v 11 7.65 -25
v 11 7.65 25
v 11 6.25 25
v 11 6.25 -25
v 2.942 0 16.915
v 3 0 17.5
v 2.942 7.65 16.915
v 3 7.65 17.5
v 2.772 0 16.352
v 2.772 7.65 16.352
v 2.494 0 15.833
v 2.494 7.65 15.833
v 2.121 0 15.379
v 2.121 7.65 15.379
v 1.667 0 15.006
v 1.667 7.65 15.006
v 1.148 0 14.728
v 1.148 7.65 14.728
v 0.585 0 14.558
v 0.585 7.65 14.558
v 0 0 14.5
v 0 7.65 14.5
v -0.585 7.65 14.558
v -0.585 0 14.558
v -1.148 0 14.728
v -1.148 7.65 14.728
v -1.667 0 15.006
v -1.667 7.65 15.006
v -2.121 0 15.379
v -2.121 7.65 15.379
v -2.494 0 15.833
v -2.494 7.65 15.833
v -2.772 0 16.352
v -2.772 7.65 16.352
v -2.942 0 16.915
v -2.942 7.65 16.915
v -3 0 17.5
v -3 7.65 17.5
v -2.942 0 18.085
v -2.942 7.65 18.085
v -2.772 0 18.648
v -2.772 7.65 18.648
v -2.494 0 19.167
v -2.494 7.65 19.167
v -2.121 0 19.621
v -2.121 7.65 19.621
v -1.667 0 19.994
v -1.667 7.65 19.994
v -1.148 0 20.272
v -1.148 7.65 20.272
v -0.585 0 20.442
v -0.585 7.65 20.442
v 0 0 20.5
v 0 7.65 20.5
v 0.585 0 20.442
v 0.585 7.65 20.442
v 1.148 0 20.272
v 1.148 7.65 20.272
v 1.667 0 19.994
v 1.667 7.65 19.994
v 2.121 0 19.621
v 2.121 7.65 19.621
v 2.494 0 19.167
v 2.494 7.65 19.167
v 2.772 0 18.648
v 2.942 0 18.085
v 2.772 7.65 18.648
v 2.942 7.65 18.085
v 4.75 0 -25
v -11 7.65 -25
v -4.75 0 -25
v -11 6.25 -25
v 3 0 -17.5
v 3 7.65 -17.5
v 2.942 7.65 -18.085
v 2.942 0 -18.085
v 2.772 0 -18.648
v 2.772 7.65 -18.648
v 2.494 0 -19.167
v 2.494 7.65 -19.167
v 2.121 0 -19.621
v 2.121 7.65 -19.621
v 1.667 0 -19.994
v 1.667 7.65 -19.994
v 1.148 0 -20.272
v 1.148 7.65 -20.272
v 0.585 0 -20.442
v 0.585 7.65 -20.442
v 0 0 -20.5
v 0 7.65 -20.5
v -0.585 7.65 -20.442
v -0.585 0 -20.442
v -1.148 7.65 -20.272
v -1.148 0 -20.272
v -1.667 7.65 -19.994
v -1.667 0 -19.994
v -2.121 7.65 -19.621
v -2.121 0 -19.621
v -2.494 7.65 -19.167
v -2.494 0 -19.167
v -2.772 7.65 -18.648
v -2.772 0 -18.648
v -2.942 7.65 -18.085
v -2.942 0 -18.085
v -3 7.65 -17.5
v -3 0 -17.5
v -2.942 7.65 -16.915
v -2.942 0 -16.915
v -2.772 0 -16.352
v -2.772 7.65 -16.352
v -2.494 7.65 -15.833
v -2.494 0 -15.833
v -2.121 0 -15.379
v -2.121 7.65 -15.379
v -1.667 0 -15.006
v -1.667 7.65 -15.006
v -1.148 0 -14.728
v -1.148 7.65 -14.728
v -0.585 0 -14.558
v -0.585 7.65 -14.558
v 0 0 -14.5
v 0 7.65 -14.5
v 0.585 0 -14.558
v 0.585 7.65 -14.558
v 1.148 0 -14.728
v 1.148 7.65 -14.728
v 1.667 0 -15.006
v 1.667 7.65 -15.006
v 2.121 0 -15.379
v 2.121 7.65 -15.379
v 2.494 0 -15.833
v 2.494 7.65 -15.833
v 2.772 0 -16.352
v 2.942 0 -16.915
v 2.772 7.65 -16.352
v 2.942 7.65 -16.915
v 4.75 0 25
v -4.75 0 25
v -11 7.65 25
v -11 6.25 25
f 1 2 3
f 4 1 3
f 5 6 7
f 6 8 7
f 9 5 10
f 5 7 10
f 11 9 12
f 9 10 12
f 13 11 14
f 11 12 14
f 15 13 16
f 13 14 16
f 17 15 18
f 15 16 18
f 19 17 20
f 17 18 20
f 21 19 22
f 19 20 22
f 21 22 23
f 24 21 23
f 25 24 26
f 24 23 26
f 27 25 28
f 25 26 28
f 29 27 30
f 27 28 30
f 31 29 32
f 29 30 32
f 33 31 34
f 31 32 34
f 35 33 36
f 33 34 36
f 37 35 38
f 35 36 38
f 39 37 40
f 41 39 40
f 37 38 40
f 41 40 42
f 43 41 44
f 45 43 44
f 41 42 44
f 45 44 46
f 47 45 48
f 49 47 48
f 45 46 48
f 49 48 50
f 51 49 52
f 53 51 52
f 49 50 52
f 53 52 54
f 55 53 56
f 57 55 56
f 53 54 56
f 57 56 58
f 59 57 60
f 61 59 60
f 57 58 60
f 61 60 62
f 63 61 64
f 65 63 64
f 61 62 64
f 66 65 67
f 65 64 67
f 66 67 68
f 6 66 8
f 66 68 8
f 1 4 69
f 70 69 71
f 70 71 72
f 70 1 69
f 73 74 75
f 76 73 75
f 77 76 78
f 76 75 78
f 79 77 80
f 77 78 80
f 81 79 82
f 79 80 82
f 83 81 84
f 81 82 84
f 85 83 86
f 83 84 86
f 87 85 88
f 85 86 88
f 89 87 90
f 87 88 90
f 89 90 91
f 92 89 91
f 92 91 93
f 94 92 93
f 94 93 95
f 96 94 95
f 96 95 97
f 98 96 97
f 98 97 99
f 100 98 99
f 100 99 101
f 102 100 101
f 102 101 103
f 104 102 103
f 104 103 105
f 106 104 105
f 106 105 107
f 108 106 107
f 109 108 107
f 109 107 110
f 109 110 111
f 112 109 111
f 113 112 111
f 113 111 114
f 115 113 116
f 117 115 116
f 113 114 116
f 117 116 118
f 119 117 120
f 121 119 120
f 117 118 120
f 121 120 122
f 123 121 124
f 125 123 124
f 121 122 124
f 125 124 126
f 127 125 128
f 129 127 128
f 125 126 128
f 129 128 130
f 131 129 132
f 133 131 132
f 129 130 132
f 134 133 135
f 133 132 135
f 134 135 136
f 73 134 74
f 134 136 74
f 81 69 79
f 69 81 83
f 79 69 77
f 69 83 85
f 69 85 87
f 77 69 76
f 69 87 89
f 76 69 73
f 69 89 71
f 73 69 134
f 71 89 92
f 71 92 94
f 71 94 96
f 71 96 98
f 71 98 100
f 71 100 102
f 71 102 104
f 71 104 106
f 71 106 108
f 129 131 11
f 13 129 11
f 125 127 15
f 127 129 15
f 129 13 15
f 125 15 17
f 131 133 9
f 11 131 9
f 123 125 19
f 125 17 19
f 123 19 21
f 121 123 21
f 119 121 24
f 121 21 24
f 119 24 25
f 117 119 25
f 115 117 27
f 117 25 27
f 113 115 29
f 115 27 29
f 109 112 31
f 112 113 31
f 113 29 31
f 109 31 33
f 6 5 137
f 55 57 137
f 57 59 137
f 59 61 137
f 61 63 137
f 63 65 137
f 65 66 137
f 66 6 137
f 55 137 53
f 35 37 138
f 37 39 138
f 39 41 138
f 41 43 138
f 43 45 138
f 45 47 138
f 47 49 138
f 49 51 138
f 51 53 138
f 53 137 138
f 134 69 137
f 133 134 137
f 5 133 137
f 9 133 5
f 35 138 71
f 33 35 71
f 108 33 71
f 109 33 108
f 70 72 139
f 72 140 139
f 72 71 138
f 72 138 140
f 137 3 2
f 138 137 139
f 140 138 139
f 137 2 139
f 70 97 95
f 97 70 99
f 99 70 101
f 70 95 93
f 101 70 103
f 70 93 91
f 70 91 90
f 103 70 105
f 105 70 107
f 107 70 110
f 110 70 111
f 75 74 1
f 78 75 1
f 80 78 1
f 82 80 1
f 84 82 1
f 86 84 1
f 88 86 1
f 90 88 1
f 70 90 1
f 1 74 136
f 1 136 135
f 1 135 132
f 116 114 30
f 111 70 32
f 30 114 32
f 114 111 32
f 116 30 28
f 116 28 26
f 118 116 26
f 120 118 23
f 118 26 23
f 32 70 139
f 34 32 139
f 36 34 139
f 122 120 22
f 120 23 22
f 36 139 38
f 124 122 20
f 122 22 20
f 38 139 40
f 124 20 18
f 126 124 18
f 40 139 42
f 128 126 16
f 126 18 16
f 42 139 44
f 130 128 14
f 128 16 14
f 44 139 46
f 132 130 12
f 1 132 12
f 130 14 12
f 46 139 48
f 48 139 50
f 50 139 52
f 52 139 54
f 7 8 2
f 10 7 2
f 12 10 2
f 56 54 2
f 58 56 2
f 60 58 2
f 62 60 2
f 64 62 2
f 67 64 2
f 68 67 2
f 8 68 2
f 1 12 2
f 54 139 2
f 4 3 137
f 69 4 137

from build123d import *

# Parameters (mm, degrees)
BOSS_EXTRUDE1_DEPTH = 25
SKETCH2_R           = 3
CUT_EXTRUDE1_DEPTH  = 25


with BuildPart() as part:
    # Sketch1 → Boss-Extrude1 (new body, symmetric)
    with BuildSketch(Plane.XY):
        Polygon((4.75, 0), (-4.75, 0), (-11, 6.25), (-11, 7.65), (11, 7.65), (11, 6.25), align=None)
    extrude(amount=BOSS_EXTRUDE1_DEPTH, both=True)

    # Sketch2 → Cut-Extrude1 (cut, symmetric)
    with BuildSketch(Plane(origin=(0, 7.65, 0), x_dir=(1, 0, 0), z_dir=(0, 1, 0))):
        with Locations((0, 17.5)):
            Circle(SKETCH2_R)
        with Locations((0, -17.5)):
            Circle(SKETCH2_R)
    extrude(amount=CUT_EXTRUDE1_DEPTH, both=True, mode=Mode.SUBTRACT)


solid = part.part
